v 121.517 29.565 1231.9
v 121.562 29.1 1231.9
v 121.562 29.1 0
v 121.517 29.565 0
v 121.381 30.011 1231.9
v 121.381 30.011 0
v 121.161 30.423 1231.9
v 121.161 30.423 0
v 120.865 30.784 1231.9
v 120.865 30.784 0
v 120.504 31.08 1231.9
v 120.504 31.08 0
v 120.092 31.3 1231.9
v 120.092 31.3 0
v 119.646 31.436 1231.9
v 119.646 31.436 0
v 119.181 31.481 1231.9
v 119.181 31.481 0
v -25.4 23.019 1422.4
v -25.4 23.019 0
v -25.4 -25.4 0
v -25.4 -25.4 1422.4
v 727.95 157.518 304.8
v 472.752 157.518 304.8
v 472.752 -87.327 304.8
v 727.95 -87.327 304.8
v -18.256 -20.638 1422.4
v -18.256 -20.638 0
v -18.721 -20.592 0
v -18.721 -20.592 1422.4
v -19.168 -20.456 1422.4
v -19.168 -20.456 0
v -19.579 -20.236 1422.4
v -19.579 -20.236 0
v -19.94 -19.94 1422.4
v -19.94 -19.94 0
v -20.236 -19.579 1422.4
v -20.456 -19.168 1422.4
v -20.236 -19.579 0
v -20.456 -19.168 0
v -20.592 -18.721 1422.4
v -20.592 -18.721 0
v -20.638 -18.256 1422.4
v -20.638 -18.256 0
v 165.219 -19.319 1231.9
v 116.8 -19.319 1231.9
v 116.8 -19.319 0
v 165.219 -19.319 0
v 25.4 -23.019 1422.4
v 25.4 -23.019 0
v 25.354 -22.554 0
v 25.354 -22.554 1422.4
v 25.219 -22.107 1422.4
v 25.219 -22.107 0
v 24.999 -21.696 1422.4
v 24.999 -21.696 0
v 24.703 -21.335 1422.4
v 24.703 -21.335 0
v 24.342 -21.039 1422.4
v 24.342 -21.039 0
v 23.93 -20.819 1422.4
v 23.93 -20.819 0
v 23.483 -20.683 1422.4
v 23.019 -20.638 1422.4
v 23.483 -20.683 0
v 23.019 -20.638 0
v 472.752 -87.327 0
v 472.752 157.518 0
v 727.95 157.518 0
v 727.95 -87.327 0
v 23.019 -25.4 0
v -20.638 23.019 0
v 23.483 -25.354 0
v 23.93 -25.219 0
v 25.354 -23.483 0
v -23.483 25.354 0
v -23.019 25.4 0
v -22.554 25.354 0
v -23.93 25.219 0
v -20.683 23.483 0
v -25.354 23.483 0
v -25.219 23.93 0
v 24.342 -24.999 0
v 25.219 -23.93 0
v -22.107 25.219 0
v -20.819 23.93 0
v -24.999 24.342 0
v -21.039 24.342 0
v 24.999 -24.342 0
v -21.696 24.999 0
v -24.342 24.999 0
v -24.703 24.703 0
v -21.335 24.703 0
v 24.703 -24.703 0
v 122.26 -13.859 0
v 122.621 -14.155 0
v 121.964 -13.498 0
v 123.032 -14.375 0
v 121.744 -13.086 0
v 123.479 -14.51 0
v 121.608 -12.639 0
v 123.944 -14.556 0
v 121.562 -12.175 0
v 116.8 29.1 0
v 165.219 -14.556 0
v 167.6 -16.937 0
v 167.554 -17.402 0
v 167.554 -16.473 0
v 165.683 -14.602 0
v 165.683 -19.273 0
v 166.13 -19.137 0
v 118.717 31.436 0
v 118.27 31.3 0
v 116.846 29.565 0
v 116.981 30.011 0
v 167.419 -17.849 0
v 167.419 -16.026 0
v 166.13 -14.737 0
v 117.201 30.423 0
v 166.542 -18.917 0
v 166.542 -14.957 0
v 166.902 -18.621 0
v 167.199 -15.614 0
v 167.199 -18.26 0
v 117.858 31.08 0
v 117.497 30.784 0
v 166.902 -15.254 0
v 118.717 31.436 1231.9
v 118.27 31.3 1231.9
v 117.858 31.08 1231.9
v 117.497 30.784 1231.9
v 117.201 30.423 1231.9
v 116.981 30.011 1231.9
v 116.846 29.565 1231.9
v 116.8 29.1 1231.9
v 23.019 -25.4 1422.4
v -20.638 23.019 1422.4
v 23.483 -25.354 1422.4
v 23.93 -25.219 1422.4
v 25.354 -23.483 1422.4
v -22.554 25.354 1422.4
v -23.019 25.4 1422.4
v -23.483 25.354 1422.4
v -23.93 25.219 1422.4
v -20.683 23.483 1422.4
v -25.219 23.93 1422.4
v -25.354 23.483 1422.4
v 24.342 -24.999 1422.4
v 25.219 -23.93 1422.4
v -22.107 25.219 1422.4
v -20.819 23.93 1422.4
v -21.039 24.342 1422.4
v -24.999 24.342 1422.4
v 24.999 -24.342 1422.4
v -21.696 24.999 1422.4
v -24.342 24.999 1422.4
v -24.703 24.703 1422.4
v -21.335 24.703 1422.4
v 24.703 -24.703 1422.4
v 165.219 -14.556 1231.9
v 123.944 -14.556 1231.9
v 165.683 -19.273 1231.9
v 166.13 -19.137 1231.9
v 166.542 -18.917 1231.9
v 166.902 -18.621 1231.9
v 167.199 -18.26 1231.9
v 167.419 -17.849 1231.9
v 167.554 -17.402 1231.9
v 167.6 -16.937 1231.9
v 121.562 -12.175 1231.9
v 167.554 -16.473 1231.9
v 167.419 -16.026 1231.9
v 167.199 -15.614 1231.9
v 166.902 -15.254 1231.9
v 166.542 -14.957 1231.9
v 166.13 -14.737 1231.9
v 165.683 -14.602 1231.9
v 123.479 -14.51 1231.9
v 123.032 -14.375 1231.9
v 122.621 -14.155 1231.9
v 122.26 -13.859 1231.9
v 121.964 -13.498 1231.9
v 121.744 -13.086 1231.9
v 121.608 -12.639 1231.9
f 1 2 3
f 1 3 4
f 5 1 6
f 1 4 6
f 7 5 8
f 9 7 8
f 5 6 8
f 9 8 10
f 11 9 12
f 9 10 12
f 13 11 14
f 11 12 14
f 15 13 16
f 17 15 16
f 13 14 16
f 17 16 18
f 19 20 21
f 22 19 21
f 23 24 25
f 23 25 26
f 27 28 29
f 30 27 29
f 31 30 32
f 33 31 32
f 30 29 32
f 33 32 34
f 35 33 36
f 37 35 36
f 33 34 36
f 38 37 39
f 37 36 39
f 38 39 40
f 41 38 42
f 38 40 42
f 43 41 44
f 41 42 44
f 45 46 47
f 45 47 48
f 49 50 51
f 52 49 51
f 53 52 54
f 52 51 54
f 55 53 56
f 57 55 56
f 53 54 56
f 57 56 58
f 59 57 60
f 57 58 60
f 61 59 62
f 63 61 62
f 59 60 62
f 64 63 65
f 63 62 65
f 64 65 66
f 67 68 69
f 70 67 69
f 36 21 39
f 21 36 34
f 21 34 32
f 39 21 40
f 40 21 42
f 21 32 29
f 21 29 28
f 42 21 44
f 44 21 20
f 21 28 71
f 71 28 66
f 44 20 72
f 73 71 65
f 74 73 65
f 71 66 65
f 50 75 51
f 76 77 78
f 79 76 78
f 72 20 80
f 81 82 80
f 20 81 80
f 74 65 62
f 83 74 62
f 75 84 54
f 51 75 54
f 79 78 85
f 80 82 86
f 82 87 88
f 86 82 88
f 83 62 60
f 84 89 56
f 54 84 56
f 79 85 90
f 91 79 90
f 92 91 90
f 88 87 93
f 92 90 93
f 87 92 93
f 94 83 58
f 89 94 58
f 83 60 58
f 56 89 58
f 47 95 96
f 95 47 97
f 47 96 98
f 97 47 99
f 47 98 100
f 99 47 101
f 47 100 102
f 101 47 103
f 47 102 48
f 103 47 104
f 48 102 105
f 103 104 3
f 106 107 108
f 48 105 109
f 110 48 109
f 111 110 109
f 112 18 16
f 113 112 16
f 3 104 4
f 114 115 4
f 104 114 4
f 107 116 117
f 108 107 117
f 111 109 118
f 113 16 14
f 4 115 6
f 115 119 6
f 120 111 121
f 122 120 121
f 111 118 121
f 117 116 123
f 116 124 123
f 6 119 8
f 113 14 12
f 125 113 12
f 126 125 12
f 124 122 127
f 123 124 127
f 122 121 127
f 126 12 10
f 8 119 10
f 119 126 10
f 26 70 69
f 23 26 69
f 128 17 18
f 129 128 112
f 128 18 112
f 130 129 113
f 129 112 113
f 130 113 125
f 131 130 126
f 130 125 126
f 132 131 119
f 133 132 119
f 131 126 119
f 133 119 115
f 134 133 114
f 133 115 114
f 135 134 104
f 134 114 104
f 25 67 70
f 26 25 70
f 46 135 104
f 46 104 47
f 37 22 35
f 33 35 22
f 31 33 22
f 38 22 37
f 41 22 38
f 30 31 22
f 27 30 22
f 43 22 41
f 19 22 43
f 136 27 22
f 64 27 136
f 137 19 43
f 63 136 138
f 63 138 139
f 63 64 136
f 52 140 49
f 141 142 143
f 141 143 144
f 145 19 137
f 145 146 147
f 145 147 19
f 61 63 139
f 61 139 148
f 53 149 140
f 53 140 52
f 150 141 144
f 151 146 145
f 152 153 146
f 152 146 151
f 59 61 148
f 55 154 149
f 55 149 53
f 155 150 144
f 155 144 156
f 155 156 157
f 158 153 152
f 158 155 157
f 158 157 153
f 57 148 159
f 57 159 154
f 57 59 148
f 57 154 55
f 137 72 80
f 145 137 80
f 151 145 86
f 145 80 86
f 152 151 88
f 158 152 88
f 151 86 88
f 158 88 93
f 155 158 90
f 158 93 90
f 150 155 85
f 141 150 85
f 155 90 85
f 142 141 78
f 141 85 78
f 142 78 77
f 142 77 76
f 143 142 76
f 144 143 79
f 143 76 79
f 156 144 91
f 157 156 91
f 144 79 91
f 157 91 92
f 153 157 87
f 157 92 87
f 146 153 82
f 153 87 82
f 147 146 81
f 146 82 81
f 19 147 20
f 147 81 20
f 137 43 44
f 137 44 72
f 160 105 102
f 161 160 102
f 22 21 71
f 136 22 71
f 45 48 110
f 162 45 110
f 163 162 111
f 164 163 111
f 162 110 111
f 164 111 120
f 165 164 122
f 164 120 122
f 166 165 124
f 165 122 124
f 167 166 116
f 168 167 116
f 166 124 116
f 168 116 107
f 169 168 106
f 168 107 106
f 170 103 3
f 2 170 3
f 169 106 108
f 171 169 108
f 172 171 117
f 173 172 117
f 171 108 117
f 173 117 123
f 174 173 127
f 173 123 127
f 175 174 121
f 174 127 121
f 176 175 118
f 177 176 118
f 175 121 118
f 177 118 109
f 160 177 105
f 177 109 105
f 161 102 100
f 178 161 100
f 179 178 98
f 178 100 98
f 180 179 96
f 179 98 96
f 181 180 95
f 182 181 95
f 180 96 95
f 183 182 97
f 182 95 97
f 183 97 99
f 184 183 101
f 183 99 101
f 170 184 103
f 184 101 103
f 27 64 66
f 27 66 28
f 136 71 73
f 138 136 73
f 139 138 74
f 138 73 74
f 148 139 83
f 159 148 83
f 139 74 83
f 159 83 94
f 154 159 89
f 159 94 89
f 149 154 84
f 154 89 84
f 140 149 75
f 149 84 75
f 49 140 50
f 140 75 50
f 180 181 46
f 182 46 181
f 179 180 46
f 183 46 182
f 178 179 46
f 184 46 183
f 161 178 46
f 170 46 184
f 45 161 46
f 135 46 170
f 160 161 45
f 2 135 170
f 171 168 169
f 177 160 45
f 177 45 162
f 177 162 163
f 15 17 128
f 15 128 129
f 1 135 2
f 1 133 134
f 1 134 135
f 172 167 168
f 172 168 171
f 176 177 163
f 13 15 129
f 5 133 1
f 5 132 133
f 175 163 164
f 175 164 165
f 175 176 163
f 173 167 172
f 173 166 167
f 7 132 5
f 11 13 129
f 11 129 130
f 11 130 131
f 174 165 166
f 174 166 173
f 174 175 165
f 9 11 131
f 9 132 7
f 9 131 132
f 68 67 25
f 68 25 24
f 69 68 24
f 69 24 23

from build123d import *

# Parameters (mm, degrees)
F1_DEPTH = 1422.4
F2_DEPTH = 1231.9
F0_W     = 255.198478
F0_H     = 244.844355
F3_DEPTH = 304.8


with BuildPart() as f1:
    # F0 (on Top) → F1 (new body)
    with BuildSketch(Plane.XY):
        with BuildLine():
            Line((-25.4, 23.01875), (-25.4, -25.4))
            Line((-25.4, -25.4), (23.01875, -25.4))
            ThreePointArc((23.01875, -25.4), (24.702548, -24.702548), (25.4, -23.01875))
            ThreePointArc((25.4, -23.01875), (24.702548, -21.334952), (23.01875, -20.6375))
            Line((23.01875, -20.6375), (-18.25625, -20.6375))
            ThreePointArc((-18.25625, -20.6375), (-19.940048, -19.940048), (-20.6375, -18.25625))
            Line((-20.6375, -18.25625), (-20.6375, 23.01875))
            ThreePointArc((-20.6375, 23.01875), (-21.334952, 24.702548), (-23.01875, 25.4))
            ThreePointArc((-23.01875, 25.4), (-24.702548, 24.702548), (-25.4, 23.01875))
        make_face()
    extrude(amount=F1_DEPTH)


with BuildPart() as f2:
    # F0 (on Top) → F2 (new body)
    with BuildSketch(Plane.XY):
        with BuildLine():
            Line((116.799947, 29.100149), (116.799947, -19.318601))
            Line((116.799947, -19.318601), (165.218697, -19.318601))
            ThreePointArc((165.218697, -19.318601), (166.902495, -18.621149), (167.599947, -16.937351))
            ThreePointArc((167.599947, -16.937351), (166.902495, -15.253553), (165.218697, -14.556101))
            Line((165.218697, -14.556101), (123.943697, -14.556101))
            ThreePointArc((123.943697, -14.556101), (122.259899, -13.858649), (121.562447, -12.174851))
            Line((121.562447, -12.174851), (121.562447, 29.100149))
            ThreePointArc((121.562447, 29.100149), (120.864995, 30.783947), (119.181197, 31.481399))
            ThreePointArc((119.181197, 31.481399), (117.497399, 30.783947), (116.799947, 29.100149))
        make_face()
    extrude(amount=F2_DEPTH)


with BuildPart() as f3:
    # F0 (on Top) → F3 (new body)
    with BuildSketch(Plane.XY):
        with Locations((600.350976, 35.095419)):
            Rectangle(F0_W, F0_H)
    extrude(amount=F3_DEPTH)


solid = Compound([f1.part, f2.part, f3.part])
